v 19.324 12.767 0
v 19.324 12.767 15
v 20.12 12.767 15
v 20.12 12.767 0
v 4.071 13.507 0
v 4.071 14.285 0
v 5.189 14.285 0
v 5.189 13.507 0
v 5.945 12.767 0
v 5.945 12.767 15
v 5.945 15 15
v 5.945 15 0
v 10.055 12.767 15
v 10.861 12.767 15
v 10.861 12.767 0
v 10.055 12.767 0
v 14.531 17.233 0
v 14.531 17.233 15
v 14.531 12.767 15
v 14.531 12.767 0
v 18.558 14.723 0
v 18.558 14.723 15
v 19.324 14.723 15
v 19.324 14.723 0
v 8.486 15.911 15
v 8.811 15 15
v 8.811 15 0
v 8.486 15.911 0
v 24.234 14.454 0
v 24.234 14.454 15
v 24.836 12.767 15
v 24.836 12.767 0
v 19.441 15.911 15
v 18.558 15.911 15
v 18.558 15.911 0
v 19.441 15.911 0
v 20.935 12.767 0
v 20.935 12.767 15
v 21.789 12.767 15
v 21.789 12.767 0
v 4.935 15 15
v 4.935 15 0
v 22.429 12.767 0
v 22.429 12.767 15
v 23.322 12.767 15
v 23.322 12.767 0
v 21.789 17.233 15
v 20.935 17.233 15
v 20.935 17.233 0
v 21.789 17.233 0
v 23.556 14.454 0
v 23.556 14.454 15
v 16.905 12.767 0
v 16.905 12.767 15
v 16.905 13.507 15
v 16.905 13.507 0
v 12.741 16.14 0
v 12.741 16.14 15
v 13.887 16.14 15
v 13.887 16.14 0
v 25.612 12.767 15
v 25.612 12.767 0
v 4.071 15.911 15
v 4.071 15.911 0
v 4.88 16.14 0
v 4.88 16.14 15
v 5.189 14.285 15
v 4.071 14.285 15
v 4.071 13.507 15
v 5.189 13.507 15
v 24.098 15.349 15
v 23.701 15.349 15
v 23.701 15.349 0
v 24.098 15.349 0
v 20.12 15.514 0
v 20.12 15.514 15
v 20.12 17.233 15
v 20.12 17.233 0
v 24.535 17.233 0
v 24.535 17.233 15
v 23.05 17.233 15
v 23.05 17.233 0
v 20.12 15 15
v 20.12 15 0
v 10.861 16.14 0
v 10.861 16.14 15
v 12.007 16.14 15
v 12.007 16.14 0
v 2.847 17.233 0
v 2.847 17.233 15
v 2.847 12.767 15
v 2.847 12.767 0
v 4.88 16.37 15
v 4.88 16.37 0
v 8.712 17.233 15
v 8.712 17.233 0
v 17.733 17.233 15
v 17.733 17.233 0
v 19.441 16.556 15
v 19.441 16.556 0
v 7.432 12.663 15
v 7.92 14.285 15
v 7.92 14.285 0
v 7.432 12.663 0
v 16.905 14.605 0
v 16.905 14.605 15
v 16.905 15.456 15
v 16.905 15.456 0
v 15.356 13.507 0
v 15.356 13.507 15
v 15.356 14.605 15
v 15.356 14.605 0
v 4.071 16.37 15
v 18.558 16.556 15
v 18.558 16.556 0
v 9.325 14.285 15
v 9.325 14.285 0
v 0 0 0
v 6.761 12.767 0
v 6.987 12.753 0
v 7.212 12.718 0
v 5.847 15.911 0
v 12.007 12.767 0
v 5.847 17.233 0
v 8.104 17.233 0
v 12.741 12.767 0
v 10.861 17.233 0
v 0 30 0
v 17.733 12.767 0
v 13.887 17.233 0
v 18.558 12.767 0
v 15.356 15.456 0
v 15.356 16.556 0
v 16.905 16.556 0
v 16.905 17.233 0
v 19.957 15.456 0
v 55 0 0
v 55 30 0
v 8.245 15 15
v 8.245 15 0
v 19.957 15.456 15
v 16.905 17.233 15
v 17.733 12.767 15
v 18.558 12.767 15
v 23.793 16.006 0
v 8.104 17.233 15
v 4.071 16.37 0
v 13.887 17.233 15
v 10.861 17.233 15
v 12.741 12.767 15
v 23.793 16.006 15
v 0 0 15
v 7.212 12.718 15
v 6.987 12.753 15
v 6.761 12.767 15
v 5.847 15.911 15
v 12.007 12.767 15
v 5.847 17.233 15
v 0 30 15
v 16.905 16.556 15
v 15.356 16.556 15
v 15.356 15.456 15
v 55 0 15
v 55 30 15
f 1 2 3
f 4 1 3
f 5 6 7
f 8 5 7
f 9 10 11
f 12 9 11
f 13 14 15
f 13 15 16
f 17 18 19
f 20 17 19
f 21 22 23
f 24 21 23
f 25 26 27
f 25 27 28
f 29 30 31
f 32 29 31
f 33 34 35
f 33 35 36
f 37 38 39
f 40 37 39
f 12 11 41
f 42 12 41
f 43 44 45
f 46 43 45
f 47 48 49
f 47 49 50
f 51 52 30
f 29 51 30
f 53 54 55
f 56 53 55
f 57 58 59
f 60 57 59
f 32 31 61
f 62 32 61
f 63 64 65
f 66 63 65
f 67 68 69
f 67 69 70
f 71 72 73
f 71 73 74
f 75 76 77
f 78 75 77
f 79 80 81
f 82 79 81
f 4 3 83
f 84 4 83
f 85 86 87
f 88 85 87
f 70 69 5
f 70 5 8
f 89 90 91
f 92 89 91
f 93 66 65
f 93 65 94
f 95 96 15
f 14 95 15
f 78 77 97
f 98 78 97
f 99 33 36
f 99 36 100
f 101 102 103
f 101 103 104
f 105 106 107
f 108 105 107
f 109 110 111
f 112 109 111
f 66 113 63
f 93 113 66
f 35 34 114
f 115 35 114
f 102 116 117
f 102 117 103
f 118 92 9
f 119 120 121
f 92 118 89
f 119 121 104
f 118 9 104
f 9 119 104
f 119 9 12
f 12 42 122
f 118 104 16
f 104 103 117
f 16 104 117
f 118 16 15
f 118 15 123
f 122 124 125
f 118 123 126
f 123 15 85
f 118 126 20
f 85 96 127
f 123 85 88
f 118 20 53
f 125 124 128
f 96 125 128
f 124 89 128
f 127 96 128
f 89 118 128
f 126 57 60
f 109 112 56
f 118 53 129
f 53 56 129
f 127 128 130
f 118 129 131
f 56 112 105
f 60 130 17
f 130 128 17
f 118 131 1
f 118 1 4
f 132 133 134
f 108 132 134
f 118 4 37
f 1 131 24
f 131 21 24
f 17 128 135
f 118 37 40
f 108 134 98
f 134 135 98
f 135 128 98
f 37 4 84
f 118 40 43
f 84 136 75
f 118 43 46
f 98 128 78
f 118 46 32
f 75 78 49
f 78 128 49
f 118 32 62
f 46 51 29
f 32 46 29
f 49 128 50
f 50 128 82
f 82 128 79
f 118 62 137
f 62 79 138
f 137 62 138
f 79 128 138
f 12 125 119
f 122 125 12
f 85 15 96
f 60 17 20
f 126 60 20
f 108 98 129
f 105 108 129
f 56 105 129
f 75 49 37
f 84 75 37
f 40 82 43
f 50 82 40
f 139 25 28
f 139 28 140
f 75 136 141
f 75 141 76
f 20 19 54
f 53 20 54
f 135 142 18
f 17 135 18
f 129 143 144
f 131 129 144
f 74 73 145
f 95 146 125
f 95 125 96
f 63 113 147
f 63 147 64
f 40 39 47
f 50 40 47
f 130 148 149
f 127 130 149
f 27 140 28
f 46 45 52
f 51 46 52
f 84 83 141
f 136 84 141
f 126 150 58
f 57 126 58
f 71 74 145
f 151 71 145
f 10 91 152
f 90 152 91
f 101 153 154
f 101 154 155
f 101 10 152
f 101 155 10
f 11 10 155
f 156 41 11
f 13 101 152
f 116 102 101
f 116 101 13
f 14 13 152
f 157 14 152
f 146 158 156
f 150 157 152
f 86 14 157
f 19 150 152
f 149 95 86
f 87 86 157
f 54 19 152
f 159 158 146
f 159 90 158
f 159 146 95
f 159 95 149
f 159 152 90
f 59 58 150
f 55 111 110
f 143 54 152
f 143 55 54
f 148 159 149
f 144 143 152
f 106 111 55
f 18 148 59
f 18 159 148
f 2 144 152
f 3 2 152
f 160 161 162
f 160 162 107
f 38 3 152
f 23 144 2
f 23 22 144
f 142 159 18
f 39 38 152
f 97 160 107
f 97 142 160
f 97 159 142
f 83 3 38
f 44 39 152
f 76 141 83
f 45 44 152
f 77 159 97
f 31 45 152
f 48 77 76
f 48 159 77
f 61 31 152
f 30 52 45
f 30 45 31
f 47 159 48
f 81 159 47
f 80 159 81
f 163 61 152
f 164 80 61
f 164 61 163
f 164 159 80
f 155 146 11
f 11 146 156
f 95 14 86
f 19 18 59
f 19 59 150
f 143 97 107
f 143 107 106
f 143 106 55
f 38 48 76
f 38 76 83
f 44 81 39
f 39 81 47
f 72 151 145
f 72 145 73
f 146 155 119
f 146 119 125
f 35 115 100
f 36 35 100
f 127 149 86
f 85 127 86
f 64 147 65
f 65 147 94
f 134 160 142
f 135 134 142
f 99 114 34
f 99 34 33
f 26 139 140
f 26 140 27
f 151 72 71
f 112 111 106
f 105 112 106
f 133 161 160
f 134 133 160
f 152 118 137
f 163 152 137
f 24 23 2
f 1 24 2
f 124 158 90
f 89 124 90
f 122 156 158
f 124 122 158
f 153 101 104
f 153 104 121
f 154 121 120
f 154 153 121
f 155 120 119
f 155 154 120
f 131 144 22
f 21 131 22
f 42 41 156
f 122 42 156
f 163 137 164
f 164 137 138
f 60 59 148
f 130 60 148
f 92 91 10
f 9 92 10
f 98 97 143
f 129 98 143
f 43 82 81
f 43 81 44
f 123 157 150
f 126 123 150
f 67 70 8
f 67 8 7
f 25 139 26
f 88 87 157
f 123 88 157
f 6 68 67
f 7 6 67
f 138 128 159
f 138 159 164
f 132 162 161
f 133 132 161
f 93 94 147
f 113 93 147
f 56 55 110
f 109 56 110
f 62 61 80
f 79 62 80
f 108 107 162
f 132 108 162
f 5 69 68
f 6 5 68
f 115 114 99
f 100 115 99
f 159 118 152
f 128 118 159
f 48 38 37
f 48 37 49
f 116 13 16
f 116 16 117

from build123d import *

# Parameters (mm, degrees)
ESBO_O1_W                = 55
ESBO_O1_H                = 30
RESSALTO_EXTRUS_O1_DEPTH = 15
ESBO_O2_W                = 1.117989905
ESBO_O2_H                = 0.777728151
ESBO_O2_W_2              = 0.882636654
ESBO_O2_H_2              = 0.645102453
ESBO_O2_W_3              = 0.853871188
ESBO_O2_H_3              = 4.4656048
CORTE_EXTRUS_O1_DEPTH    = 17


with BuildPart() as part:
    # Esboço1 → Ressalto-extrusão1 (new body)
    with BuildSketch(Plane.XY):
        with Locations((27.5, 15)):
            Rectangle(ESBO_O1_W, ESBO_O1_H)
    extrude(amount=RESSALTO_EXTRUS_O1_DEPTH)

    # Esboço2 → Corte-extrusão1 (cut)
    # profile 1 of 7: a face of its own
    with BuildSketch(Plane.XY.offset(15)):
        Polygon((2.846797453, 17.2328024), (2.846797453, 12.7671976), (5.945380375, 12.7671976), (5.945380375, 15), (4.935449534, 15), (5.846797453, 15.911347918), (5.846797453, 17.2328024), align=None)
        Polygon((4.071024043, 16.36960397), (4.071024043, 15.911347918), (4.879986722, 16.140475944), (4.879986722, 16.36960397), align=None, mode=Mode.SUBTRACT)
        with Locations((4.630018996, 13.895652484)):
            Rectangle(ESBO_O2_W, ESBO_O2_H, mode=Mode.SUBTRACT)
    # profile 2 of 7: a face of its own
    with BuildSketch(Plane.XY.offset(15)):
        with BuildLine():
            Line((6.760674797, 12.7671976), (8.104023421, 17.2328024))
            Line((8.104023421, 17.2328024), (8.71206543, 17.2328024))
            Line((8.71206543, 17.2328024), (10.861423229, 12.7671976))
            Line((10.861423229, 12.7671976), (10.055414055, 12.7671976))
            Line((10.055414055, 12.7671976), (9.325107303, 14.284516559))
            Line((9.325107303, 14.284516559), (7.920196767, 14.284516559))
            Line((7.920196767, 14.284516559), (7.432349109, 12.662796921))
            ThreePointArc((7.432349109, 12.662796921), (7.100119777, 12.73820863), (6.760674797, 12.7671976))
        make_face()
        Polygon((8.485817241, 15.911347918), (8.245428539, 15), (8.811049013, 15), align=None, mode=Mode.SUBTRACT)
    # profile 3 of 7: a face of its own
    with BuildSketch(Plane.XY.offset(15)):
        Polygon((10.861423229, 17.2328024), (10.861423229, 16.140475944), (12.006832655, 16.140475944), (12.006832655, 12.7671976), (12.740621995, 12.7671976), (12.740621995, 16.140475944), (13.887403005, 16.140475944), (13.887403005, 17.2328024), align=None)
    # profile 4 of 7: a face of its own
    with BuildSketch(Plane.XY.offset(15)):
        Polygon((14.531209888, 17.2328024), (14.531209888, 12.7671976), (16.905247768, 12.7671976), (16.905247768, 13.506788408), (15.356087456, 13.506788408), (15.356087456, 14.604910757), (16.905247768, 14.604910757), (16.905247768, 15.455673959), (15.356087456, 15.455673959), (15.356087456, 16.556450371), (16.905247768, 16.556450371), (16.905247768, 17.2328024), align=None)
    # profile 5 of 7: a face of its own
    with BuildSketch(Plane.XY.offset(15)):
        Polygon((17.732915234, 17.2328024), (17.732915234, 12.7671976), (18.558020956, 12.7671976), (18.558020956, 14.723064954), (19.32422063, 14.723064954), (19.32422063, 12.7671976), (20.119873327, 12.7671976), (20.119873327, 15), (19.957257441, 15.455673959), (20.119873327, 15.513706519), (20.119873327, 17.2328024), align=None)
        with Locations((18.999339283, 16.233899145)):
            Rectangle(ESBO_O2_W_2, ESBO_O2_H_2, mode=Mode.SUBTRACT)
    # profile 6 of 7: a face of its own
    with BuildSketch(Plane.XY.offset(15)):
        with Locations((21.361867782, 15)):
            Rectangle(ESBO_O2_W_3, ESBO_O2_H_3)
    # profile 7 of 7: a face of its own
    with BuildSketch(Plane.XY.offset(15)):
        Polygon((23.050203994, 17.2328024), (22.429206767, 12.7671976), (23.321890281, 12.7671976), (23.556438186, 14.453836772), (24.233979959, 14.453836772), (24.835889105, 12.7671976), (25.611817558, 12.7671976), (24.534934532, 17.2328024), align=None)
        Polygon((23.792569263, 16.006062165), (23.701128816, 15.348511883), (24.098136816, 15.348511883), align=None, mode=Mode.SUBTRACT)
    extrude(amount=-CORTE_EXTRUS_O1_DEPTH, mode=Mode.SUBTRACT)


with BuildPart() as corte_extrus_o1_piece_1:
    # of the separate pieces the step leaves, piece 1, a body of its own (corte_extrus_o1_pieces)
    add(part.part.solids().sort_by_distance((0, 0, 0))[0])


with BuildPart() as corte_extrus_o1_piece_2:
    # of the separate pieces the step leaves, piece 2, a body of its own (corte_extrus_o1_pieces)
    add(part.part.solids().sort_by_distance((5.189013948, 13.506788408, 0))[0])


with BuildPart() as corte_extrus_o1_piece_3:
    # of the separate pieces the step leaves, piece 3, a body of its own (corte_extrus_o1_pieces)
    add(part.part.solids().sort_by_distance((19.44065761, 15.911347918, 0))[0])


with BuildPart() as corte_extrus_o1_piece_4:
    # of the separate pieces the step leaves, piece 4, a body of its own (corte_extrus_o1_pieces)
    add(part.part.solids().sort_by_distance((4.879986722, 16.140475944, 0))[0])


with BuildPart() as corte_extrus_o1_piece_5:
    # of the separate pieces the step leaves, piece 5, a body of its own (corte_extrus_o1_pieces)
    add(part.part.solids().sort_by_distance((8.811049013, 15, 0))[0])


with BuildPart() as corte_extrus_o1_piece_6:
    # of the separate pieces the step leaves, piece 6, a body of its own (corte_extrus_o1_pieces)
    add(part.part.solids().sort_by_distance((23.701128816, 15.348511883, 0))[0])


solid = Compound([corte_extrus_o1_piece_1.part, corte_extrus_o1_piece_2.part, corte_extrus_o1_piece_3.part, corte_extrus_o1_piece_4.part, corte_extrus_o1_piece_5.part, corte_extrus_o1_piece_6.part])
